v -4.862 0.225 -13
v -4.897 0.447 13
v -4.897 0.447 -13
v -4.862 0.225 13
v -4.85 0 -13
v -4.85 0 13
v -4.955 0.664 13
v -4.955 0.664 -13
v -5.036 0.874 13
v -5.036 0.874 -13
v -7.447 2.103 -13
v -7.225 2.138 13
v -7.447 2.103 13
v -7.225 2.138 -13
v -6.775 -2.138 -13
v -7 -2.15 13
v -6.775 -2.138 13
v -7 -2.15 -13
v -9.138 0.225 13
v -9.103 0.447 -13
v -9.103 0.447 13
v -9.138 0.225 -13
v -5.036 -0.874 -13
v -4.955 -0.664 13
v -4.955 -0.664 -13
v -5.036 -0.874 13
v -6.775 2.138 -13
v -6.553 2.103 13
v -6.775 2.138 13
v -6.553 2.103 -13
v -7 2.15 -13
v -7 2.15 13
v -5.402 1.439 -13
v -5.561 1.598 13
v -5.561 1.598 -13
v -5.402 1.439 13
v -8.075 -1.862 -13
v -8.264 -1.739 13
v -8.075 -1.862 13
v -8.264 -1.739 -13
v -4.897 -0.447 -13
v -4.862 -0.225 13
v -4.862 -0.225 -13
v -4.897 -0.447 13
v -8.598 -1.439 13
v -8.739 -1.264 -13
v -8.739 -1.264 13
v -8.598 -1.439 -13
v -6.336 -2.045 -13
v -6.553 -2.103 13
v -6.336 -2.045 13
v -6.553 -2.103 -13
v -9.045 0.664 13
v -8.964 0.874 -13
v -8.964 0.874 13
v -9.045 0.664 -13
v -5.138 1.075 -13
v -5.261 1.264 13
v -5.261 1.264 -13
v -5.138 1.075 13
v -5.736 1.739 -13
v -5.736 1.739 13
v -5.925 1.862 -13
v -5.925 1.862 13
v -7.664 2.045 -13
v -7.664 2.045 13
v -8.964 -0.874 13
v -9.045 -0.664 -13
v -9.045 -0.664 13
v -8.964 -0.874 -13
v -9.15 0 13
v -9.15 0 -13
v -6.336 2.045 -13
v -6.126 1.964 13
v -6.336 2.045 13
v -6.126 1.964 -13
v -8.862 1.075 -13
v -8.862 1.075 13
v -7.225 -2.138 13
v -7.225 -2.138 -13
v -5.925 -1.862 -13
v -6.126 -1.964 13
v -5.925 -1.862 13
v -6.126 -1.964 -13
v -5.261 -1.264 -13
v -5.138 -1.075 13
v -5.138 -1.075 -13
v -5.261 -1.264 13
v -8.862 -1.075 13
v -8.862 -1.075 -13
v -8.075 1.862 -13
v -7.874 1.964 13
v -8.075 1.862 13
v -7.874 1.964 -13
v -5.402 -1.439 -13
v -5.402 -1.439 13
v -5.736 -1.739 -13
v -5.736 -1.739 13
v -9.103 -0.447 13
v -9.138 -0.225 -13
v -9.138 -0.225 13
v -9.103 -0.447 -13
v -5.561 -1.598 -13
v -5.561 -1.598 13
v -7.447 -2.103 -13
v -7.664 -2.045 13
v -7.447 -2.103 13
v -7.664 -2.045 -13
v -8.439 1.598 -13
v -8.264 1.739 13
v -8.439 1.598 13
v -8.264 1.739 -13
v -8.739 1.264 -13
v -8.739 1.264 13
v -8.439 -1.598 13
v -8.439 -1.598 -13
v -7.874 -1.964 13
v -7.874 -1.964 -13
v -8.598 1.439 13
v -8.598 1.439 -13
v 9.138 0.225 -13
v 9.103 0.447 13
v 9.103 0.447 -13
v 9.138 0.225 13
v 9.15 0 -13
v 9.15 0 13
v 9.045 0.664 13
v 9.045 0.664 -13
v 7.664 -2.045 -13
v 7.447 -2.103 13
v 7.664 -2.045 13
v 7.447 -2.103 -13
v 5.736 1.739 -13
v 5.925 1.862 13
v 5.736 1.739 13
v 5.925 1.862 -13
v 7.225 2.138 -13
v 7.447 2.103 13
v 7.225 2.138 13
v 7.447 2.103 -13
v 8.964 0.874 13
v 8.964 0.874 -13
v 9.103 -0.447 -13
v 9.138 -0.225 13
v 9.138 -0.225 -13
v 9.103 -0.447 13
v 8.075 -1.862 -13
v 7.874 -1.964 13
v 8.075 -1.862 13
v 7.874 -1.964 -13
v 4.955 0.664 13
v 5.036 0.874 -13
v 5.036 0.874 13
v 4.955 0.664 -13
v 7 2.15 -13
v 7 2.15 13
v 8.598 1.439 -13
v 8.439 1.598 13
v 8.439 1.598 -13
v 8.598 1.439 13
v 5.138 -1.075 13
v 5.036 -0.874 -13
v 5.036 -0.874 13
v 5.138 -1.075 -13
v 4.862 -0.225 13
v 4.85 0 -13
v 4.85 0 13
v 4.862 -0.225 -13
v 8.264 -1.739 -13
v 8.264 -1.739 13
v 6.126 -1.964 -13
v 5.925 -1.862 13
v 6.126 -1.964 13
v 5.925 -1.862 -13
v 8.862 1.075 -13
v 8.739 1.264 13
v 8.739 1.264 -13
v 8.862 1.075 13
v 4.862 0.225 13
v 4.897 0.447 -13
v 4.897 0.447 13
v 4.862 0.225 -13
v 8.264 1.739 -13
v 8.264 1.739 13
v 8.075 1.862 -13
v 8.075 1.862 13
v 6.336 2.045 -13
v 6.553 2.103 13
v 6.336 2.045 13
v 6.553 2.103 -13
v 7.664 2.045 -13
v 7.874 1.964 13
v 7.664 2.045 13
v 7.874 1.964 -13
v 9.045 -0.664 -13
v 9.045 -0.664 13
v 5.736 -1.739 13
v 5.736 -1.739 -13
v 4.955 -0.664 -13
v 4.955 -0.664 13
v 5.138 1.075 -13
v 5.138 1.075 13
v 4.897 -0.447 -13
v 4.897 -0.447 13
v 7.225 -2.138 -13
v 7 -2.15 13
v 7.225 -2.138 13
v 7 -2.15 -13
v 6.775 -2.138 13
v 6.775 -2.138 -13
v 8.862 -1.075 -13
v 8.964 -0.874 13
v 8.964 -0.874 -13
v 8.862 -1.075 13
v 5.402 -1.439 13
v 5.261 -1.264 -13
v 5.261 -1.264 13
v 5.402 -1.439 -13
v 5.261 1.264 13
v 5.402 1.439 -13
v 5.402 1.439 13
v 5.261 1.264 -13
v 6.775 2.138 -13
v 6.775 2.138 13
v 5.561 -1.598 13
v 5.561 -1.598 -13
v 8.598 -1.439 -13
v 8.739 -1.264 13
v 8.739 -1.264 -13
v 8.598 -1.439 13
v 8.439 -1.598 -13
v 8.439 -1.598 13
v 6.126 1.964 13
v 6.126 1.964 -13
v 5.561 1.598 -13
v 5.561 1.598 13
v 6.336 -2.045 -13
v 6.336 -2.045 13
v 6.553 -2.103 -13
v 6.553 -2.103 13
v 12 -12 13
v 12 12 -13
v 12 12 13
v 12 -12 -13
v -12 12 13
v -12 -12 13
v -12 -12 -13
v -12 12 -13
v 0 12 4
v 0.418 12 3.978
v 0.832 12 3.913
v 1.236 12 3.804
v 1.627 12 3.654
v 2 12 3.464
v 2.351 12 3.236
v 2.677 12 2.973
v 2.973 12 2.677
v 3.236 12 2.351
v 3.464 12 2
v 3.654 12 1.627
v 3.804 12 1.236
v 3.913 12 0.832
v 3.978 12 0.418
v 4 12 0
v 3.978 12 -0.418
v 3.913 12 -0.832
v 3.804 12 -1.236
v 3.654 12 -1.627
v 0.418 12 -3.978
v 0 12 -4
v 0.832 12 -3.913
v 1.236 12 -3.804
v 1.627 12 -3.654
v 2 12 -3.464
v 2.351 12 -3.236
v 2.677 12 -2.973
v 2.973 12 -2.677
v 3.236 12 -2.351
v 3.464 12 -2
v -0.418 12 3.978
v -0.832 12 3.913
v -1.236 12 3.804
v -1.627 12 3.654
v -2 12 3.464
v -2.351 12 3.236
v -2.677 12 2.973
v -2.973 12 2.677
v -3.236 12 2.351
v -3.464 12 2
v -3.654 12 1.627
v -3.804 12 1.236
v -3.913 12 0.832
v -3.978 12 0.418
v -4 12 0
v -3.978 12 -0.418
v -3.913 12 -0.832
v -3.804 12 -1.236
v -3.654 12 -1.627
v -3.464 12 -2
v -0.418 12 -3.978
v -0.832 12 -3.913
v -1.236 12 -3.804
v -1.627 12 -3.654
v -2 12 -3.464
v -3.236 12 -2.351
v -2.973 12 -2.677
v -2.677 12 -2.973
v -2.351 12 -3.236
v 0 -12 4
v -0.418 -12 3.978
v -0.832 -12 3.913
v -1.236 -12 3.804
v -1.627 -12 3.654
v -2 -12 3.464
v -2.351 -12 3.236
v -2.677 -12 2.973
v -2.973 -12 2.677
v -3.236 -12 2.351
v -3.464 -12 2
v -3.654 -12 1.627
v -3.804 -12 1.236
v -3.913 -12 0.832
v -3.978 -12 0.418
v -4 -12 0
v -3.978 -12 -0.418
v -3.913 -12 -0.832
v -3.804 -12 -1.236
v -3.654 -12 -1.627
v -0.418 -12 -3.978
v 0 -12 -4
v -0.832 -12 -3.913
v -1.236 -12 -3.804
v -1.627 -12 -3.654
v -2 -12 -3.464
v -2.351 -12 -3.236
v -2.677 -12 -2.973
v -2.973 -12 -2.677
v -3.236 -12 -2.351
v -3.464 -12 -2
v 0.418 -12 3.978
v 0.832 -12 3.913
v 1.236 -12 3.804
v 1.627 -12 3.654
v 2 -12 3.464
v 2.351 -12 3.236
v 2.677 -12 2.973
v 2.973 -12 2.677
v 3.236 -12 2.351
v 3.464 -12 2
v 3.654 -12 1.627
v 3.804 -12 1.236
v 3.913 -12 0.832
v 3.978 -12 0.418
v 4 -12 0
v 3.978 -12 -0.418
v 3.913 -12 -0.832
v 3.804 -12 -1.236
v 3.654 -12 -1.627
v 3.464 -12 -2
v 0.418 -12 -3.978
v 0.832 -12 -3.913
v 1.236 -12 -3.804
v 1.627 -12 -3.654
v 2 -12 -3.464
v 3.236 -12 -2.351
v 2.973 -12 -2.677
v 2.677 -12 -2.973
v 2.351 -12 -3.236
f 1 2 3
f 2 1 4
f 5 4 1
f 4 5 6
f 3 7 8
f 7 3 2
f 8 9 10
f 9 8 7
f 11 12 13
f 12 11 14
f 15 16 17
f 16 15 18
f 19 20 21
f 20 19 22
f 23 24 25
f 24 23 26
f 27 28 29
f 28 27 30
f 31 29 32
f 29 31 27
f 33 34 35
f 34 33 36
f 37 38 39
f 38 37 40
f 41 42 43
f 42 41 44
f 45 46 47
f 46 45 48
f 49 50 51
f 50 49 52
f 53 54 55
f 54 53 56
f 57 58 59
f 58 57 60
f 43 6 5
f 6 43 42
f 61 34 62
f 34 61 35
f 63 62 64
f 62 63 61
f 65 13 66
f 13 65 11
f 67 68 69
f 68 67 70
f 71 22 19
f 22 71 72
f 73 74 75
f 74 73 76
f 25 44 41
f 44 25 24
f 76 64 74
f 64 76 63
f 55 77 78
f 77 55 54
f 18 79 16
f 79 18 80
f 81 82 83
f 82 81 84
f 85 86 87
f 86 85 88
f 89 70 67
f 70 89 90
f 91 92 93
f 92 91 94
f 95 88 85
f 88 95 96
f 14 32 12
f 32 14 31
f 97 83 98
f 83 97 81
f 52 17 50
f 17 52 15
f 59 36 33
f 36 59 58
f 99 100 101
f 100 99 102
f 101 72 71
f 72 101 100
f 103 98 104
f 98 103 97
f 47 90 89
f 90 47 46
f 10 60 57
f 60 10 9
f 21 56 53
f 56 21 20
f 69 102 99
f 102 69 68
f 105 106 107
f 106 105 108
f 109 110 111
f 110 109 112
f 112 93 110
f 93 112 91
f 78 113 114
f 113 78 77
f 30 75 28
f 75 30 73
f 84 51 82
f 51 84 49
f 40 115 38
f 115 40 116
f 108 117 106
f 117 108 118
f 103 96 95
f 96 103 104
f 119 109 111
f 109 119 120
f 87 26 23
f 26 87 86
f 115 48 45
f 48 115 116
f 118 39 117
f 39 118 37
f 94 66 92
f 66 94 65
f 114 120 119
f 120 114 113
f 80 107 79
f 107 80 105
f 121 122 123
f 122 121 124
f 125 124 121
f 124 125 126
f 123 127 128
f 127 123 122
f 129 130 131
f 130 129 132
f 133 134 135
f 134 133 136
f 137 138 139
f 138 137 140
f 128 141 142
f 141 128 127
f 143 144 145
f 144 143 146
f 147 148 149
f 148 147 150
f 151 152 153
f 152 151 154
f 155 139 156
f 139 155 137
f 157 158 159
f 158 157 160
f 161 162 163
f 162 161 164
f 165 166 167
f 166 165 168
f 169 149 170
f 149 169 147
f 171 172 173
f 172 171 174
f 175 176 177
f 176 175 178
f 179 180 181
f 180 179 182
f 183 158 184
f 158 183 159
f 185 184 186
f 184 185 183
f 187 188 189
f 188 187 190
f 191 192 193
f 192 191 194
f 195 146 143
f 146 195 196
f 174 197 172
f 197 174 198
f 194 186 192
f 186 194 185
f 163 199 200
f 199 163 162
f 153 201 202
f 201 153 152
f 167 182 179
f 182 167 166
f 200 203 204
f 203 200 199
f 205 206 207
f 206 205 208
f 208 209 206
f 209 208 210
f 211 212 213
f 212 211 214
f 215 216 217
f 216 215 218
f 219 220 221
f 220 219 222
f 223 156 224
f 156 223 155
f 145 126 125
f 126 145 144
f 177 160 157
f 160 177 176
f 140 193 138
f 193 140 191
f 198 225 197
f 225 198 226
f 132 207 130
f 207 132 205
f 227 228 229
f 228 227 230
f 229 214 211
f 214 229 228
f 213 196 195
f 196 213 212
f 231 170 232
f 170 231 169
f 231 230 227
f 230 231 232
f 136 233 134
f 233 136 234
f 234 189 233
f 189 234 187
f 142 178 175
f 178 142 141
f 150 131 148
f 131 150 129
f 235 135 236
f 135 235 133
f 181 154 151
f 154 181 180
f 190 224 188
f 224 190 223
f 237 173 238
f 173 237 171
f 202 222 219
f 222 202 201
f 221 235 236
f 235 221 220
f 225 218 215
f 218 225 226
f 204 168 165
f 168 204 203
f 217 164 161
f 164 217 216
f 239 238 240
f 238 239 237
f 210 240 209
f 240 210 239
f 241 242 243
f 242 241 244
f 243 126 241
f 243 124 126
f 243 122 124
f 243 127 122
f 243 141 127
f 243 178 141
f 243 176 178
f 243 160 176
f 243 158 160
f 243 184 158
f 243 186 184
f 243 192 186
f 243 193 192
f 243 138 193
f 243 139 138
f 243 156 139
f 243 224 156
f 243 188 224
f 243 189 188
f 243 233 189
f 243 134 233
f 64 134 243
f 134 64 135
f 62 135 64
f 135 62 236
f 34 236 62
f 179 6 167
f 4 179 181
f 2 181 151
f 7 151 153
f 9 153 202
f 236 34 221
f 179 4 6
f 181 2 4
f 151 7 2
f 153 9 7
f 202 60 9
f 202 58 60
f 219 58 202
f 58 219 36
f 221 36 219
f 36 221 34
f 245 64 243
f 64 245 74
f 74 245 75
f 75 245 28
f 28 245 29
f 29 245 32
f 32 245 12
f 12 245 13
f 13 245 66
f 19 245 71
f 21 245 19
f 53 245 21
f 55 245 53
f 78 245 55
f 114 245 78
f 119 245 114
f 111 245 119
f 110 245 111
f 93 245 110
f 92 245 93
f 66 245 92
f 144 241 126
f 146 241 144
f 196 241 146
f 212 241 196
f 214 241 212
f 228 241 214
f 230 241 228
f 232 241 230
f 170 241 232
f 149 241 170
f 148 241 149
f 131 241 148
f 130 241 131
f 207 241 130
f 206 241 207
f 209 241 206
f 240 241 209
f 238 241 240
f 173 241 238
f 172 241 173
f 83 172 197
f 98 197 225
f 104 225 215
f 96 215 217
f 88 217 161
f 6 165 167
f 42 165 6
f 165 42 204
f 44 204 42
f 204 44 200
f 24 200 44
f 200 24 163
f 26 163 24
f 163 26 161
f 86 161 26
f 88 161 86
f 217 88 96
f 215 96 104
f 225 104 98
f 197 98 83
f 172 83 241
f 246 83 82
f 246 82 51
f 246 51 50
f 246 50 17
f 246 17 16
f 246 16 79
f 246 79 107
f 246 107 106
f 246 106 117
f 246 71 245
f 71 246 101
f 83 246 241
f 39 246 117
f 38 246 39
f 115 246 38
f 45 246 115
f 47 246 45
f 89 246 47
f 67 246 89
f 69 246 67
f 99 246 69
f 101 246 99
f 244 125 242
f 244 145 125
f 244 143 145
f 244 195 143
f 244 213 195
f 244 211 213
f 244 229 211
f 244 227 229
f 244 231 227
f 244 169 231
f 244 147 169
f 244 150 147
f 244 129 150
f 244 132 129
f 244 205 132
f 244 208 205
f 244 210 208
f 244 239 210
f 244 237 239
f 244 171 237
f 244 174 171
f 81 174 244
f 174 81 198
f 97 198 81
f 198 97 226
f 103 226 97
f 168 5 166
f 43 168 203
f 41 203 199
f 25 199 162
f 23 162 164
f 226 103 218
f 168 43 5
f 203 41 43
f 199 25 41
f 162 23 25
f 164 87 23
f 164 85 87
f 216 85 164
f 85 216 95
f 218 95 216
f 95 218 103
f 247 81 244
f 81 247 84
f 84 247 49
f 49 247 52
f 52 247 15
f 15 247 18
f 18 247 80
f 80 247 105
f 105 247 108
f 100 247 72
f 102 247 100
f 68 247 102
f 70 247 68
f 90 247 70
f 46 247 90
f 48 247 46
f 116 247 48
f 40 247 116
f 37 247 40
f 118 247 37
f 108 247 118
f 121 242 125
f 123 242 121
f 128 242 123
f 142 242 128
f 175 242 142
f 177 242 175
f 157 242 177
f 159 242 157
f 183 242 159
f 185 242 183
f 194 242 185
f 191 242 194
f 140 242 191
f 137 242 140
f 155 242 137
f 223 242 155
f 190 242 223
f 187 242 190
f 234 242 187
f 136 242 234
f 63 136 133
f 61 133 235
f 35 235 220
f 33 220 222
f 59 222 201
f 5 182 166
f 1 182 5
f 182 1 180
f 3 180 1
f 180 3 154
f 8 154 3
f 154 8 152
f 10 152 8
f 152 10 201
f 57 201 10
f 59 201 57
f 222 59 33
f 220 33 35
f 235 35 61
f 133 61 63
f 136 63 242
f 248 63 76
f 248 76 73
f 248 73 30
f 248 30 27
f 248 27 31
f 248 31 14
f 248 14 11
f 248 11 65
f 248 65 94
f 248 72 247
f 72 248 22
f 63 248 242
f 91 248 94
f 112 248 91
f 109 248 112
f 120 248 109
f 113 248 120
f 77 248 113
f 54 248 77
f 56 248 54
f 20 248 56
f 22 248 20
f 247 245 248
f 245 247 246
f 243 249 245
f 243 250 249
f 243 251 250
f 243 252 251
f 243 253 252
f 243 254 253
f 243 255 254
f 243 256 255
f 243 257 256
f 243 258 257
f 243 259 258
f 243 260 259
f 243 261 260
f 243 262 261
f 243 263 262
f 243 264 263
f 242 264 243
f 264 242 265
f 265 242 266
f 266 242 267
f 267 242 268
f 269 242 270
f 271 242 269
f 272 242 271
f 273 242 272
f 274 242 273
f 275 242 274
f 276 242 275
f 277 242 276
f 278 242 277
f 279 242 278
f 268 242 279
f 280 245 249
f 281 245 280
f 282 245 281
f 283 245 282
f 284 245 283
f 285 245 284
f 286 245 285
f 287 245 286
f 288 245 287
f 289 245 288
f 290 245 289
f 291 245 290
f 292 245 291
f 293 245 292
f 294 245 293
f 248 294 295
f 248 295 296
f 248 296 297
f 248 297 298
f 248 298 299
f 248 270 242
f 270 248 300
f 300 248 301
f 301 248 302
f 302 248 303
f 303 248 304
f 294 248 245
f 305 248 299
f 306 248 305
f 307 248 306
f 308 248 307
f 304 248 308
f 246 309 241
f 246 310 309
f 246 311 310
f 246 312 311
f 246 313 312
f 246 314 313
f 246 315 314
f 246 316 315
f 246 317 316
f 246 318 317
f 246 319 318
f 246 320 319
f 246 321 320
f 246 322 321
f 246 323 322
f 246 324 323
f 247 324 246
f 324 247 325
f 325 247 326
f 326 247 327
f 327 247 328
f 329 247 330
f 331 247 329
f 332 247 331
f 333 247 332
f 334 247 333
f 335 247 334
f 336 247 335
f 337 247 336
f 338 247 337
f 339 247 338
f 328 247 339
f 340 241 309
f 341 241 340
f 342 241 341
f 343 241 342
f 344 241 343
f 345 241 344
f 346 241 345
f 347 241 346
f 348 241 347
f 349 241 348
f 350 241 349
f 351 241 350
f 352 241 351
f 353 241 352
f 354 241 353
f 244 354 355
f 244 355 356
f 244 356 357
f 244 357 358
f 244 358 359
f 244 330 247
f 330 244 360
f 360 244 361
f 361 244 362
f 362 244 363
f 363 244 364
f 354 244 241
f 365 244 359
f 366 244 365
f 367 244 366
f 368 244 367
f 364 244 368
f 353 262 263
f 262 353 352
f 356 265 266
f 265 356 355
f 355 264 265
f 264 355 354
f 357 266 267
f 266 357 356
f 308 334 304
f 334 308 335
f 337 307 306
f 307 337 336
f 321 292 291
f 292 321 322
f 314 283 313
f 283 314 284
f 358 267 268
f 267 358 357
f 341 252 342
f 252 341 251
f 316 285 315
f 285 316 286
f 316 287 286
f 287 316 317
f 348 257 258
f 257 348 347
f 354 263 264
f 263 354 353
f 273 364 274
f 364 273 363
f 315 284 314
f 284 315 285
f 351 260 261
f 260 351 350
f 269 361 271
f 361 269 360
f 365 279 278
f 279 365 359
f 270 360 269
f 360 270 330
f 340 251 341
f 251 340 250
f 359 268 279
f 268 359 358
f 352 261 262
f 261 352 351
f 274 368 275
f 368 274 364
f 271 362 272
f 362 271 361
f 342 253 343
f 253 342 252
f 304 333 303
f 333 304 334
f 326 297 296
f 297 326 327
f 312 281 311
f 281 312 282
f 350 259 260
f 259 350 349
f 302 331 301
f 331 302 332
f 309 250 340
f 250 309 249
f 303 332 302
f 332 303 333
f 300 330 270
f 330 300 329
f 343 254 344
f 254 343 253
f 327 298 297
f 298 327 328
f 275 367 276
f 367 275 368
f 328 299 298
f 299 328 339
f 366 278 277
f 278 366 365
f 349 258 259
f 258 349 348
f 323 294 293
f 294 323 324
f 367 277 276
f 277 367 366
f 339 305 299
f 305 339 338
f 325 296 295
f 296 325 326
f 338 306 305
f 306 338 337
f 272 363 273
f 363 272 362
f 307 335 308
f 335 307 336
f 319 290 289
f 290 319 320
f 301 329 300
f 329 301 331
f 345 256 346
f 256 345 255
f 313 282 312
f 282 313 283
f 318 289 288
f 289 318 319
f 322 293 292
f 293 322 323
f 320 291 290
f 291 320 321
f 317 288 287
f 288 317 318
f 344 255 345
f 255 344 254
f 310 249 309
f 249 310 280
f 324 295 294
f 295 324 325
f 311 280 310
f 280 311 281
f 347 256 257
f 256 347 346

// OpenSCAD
// Linear rail stop block.
$fn = 60;
eps = 0.02;
width = 24;
height = 26;
bore_d = 8;
length = 24;
difference() {
    cube([length,width,height],center=true);
    translate([0,-width/2-eps,0]) rotate([-90,0,0]) cylinder(d=bore_d,h=width+2*eps);
    for(x=[-7,7]) translate([x,0,-height/2-eps]) cylinder(d=4.3,h=height+2*eps);
}
